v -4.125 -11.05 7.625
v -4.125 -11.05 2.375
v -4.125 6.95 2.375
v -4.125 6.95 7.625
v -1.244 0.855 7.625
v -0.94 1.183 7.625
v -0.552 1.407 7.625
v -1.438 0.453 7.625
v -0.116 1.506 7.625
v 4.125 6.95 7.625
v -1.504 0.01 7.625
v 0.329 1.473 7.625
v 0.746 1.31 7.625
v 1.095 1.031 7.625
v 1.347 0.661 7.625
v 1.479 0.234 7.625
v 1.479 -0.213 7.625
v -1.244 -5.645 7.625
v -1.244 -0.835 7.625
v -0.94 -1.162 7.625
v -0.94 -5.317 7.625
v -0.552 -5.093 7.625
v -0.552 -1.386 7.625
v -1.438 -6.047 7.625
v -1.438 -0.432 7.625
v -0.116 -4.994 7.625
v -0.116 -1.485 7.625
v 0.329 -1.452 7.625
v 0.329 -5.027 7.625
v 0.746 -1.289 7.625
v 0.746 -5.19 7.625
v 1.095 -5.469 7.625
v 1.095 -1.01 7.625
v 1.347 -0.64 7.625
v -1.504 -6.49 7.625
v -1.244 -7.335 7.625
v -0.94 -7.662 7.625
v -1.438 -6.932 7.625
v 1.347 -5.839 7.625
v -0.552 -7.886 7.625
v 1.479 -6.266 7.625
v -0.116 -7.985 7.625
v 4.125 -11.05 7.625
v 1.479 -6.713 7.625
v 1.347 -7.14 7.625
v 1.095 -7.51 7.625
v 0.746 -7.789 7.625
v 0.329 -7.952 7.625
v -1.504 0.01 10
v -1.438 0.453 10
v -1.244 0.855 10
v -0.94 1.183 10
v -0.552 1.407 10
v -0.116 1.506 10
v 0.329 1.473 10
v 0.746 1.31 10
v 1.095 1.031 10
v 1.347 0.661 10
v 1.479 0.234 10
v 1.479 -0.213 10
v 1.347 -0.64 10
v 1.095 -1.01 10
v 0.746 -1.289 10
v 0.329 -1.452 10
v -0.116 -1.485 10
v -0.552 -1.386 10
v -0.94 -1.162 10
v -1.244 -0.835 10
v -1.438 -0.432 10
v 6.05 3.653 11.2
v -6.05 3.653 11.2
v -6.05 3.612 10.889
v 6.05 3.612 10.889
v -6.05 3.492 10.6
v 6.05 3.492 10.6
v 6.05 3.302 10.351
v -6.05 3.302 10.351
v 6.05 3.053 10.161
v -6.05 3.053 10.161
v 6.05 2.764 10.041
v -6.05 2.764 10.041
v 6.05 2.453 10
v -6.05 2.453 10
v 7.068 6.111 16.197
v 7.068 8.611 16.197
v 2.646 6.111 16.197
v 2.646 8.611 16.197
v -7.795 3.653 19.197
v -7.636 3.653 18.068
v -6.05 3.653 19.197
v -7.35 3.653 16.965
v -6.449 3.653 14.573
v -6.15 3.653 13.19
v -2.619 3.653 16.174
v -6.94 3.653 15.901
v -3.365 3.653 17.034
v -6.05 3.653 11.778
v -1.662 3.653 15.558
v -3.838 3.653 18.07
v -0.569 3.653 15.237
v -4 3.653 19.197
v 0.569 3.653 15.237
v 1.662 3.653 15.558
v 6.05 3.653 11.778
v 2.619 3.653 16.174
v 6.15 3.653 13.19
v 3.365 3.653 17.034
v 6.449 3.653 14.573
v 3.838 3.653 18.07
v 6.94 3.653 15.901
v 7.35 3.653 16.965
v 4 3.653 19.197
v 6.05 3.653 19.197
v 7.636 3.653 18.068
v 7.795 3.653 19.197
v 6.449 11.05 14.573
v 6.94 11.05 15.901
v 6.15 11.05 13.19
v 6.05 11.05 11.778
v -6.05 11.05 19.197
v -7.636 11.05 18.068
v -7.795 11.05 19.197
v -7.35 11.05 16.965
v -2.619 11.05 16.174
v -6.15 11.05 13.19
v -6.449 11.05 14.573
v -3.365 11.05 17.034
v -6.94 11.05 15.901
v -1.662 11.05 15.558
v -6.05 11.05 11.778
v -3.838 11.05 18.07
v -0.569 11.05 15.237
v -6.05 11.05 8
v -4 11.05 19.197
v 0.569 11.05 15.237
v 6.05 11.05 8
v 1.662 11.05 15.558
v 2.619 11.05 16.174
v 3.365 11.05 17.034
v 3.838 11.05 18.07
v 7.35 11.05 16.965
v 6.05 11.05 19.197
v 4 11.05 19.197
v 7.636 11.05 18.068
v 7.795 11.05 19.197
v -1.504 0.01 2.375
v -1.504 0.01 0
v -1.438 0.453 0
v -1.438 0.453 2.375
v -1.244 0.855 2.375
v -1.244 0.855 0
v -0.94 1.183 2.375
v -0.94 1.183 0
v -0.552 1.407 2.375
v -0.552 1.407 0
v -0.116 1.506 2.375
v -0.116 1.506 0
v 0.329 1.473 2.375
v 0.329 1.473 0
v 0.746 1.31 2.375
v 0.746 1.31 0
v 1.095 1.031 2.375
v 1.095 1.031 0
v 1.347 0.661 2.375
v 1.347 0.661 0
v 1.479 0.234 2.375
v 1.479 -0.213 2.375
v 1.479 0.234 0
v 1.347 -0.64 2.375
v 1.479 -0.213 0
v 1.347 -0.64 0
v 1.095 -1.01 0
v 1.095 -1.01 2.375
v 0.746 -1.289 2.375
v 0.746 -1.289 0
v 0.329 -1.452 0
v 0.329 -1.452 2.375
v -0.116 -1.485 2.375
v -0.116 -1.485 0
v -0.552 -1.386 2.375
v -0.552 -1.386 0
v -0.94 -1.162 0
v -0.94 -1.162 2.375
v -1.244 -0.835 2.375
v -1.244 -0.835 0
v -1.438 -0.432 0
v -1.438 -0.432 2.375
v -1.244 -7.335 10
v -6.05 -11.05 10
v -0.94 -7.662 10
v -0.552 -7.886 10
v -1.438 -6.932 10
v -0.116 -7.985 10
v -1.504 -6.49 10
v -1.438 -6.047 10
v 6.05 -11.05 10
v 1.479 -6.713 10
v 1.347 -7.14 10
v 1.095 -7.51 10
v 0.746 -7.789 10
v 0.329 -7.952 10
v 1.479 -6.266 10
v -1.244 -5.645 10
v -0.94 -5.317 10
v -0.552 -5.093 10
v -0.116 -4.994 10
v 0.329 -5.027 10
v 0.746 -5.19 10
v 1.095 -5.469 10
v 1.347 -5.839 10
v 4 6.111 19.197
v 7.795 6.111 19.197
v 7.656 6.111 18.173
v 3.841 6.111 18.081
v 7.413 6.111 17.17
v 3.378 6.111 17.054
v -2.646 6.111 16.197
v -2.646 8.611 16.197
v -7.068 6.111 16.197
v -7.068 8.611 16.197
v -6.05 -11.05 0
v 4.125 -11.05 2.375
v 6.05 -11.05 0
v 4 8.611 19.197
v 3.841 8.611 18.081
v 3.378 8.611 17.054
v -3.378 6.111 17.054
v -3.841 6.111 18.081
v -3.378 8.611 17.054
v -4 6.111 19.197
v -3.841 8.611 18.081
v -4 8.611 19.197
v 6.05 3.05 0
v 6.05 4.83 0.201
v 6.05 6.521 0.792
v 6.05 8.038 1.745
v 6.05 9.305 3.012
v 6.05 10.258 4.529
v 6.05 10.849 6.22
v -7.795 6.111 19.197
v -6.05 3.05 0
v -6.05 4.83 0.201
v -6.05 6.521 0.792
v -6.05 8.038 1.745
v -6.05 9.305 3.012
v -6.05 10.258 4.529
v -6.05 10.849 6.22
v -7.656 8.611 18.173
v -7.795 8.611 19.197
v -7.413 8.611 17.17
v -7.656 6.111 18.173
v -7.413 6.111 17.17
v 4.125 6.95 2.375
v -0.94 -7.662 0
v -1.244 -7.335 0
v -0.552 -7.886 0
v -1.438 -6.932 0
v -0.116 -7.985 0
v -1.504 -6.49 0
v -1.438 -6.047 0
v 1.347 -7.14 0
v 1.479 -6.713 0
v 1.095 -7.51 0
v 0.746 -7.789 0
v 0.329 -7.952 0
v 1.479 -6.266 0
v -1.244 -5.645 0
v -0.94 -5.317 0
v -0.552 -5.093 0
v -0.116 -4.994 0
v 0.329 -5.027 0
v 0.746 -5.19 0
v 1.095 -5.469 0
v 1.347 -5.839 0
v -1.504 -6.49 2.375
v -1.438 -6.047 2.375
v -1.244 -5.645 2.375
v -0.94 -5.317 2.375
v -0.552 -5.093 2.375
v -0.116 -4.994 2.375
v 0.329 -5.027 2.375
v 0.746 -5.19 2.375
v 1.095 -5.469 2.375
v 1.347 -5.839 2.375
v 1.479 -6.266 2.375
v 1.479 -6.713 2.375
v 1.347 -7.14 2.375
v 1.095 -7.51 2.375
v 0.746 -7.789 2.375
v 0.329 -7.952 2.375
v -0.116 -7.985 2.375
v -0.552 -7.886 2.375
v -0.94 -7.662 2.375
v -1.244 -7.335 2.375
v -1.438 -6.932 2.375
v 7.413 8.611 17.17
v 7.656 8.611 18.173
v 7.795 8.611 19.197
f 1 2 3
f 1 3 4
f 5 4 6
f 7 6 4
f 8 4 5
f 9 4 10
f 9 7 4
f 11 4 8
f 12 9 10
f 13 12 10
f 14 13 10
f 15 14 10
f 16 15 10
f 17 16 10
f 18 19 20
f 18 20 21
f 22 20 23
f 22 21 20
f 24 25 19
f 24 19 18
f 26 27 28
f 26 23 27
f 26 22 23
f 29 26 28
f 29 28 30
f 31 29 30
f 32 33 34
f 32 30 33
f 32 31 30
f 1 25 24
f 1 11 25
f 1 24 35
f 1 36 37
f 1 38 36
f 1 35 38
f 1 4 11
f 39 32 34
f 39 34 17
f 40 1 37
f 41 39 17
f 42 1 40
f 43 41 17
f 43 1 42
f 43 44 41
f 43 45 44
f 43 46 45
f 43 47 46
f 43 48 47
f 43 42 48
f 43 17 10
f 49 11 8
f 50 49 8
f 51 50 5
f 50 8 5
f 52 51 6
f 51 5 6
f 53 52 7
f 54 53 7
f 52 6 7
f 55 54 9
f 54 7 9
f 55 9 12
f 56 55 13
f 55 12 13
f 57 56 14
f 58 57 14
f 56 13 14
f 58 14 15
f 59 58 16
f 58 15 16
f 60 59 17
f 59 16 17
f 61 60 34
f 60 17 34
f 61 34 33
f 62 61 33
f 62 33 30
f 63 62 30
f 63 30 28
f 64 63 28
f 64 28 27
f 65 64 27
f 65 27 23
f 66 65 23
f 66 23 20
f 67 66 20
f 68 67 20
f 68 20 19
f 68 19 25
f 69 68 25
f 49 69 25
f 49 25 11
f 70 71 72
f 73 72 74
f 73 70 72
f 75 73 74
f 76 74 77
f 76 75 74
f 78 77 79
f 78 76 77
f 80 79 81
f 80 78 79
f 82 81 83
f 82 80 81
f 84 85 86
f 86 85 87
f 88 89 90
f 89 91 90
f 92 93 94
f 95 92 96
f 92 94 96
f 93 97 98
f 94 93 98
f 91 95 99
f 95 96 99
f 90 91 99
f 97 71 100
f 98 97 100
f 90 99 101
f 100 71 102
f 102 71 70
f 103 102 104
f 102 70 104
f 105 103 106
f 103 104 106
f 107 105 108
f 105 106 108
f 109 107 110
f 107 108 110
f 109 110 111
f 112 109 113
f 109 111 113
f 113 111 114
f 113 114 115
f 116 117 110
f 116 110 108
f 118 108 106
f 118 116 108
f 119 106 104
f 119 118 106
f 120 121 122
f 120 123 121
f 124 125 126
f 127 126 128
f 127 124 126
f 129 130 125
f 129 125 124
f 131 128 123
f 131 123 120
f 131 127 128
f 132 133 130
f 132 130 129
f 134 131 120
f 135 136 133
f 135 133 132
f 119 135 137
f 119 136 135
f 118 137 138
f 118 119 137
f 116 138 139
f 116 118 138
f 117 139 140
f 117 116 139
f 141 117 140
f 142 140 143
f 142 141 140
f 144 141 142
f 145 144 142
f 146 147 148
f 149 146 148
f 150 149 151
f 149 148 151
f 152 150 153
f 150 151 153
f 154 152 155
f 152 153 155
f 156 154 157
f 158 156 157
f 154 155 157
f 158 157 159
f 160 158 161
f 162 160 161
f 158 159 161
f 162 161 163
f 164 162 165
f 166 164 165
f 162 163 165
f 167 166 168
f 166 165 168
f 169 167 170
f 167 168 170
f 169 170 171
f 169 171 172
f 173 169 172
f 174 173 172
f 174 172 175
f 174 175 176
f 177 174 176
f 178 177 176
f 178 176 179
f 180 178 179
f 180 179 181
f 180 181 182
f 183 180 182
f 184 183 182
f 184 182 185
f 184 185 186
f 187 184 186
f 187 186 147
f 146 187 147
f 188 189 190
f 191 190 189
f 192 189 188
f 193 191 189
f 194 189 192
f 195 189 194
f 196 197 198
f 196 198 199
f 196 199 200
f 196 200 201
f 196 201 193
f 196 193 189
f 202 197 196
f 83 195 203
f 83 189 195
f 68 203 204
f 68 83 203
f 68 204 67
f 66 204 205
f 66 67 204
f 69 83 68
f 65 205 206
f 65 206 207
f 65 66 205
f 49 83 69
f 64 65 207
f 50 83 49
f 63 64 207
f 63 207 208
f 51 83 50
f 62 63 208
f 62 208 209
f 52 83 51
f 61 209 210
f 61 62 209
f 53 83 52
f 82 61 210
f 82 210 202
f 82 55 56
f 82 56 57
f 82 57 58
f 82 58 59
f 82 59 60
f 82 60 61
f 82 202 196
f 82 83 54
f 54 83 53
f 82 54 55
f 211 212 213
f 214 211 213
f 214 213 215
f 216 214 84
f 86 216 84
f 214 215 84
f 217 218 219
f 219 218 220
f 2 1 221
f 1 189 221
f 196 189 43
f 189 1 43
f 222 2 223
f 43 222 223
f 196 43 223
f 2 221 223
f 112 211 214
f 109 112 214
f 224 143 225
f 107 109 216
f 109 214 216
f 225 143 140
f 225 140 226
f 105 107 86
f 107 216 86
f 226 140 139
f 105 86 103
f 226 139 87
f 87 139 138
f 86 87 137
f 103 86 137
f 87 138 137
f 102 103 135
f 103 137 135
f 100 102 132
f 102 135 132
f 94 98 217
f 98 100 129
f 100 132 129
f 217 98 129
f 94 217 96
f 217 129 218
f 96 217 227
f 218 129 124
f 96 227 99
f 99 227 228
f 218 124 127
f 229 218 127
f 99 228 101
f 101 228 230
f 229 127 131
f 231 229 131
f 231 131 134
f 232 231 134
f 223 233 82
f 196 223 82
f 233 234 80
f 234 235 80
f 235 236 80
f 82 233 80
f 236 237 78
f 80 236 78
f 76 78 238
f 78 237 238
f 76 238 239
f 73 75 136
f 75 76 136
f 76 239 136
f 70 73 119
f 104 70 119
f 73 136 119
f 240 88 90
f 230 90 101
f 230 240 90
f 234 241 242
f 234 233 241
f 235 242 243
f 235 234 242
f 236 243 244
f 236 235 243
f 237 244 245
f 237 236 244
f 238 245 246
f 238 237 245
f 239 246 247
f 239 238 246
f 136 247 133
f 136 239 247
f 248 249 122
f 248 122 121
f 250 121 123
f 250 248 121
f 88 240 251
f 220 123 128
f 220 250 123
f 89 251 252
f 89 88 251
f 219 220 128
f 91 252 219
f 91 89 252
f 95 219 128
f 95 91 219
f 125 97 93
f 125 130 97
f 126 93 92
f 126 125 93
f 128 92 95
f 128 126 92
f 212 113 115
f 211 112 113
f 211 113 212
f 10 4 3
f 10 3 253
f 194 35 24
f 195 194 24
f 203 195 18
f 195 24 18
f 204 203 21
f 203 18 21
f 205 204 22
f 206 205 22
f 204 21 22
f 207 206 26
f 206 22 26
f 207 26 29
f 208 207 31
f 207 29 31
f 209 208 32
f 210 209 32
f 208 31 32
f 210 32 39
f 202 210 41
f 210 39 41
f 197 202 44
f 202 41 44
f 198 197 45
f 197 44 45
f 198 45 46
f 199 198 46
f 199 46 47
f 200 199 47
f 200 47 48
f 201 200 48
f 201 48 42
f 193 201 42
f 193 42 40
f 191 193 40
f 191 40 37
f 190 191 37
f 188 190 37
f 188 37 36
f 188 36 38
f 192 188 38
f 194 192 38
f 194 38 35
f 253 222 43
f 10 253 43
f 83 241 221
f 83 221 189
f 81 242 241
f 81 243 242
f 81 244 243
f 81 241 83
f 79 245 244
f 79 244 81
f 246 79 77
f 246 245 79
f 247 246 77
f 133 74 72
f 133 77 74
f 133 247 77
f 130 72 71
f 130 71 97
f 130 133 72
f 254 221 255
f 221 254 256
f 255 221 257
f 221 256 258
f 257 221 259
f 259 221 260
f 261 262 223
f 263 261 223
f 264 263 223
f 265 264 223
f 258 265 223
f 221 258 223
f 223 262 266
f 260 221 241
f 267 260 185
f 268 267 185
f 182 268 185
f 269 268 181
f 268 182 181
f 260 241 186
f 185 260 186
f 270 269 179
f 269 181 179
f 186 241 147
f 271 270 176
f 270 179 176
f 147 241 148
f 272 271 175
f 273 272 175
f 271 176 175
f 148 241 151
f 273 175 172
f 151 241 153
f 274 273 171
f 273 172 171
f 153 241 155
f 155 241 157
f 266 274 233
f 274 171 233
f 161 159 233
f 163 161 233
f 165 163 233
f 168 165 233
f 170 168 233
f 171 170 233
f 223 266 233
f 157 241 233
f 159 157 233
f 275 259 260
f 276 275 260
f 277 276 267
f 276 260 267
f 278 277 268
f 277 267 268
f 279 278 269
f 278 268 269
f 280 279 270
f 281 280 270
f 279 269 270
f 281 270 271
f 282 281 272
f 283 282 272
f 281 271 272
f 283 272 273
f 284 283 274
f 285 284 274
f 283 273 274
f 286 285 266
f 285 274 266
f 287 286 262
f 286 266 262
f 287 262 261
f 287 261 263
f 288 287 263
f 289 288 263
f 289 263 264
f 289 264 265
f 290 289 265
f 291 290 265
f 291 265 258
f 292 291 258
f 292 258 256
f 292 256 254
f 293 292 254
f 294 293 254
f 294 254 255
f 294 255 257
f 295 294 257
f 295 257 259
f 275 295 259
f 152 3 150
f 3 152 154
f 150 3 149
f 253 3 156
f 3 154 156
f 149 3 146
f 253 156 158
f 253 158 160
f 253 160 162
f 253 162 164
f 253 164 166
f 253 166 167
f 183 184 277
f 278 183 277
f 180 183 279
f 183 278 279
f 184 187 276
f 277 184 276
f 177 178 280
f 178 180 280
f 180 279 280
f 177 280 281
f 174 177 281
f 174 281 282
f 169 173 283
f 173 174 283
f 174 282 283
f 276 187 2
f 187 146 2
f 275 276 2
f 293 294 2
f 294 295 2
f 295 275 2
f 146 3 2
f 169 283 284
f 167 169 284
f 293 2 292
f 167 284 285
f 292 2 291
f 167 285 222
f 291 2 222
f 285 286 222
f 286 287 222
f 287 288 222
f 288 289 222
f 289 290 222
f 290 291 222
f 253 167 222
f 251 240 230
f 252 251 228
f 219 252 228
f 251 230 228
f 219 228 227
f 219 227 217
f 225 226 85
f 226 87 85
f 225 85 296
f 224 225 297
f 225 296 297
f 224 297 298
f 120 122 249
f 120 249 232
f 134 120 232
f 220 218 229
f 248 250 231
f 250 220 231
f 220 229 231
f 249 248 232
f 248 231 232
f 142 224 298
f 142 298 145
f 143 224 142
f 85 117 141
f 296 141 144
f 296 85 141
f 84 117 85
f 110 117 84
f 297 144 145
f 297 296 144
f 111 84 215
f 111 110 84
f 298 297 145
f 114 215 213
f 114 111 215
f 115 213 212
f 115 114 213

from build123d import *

# Parameters (mm, degrees)
IZIM1_W                     = 12.1
IZIM1_H                     = 22.1
Y_KSEKLIK_EKSTR_ZYON1_DEPTH = 10
IZIM2_W                     = 8.25
IZIM2_H                     = 5.25
KES_EKSTR_ZYON1_DEPTH       = 18
IZIM3_R                     = 1.5
KES_EKSTR_ZYON2_DEPTH       = 17.084309124
IZIM4_W                     = 9.196571059
IZIM4_H                     = 7.396734232
Y_KSEKLIK_EKSTR_ZYON2_DEPTH = 12.1
IZIM6_W                     = 3.5
IZIM6_H                     = 2.438999841
IZIM6_H_2                   = 2.5
IZIM6_H_3                   = 2.457734391
IZIM6_W_2                   = 4.3
KES_EKSTR_ZYON3_DEPTH       = 3
RADYUS1_R                   = 1.2
RADYUS2_R                   = 8
IZIM7_R                     = 4
KES_EKSTR_ZYON4_DEPTH       = 10
IZIM8_W                     = 1.744878744
IZIM8_H                     = 1.717356621
Y_KSEKLIK_EKSTR_ZYON3_DEPTH = 7.396734232
KES_EKSTR_ZYON5_DEPTH       = 50
KES_EKSTR_ZYON5_DEPTH_BACK  = 50
IZIM9_W                     = 3
IZIM9_H                     = 2.5
RADYUS3_R                   = 10
RADYUS4_START               = 3
RADYUS4_DEPTH               = 9


with BuildPart() as part:
    # Çizim1 → Yükseklik-Ekstrüzyon1 (new body)
    with BuildSketch(Plane.XY):
        Rectangle(IZIM1_W, IZIM1_H)
    extrude(amount=Y_KSEKLIK_EKSTR_ZYON1_DEPTH)

    # Çizim2 → Kes-Ekstrüzyon1 (cut)
    with BuildSketch(Plane.XZ.offset(11.05)):
        with Locations((0, 5)):
            Rectangle(IZIM2_W, IZIM2_H)
    extrude(amount=-KES_EKSTR_ZYON1_DEPTH, mode=Mode.SUBTRACT)

    # Çizim3 → Kes-Ekstrüzyon2 (cut, through all)
    with BuildSketch(Plane(origin=(0, 0, 0), x_dir=(-1, 0, 0), z_dir=(0, 0, -1))):
        with Locations((0.004348468, -6.489526702)):
            Circle(IZIM3_R)
        with Locations((0.004348468, 0.010473298)):
            Circle(IZIM3_R)
    extrude(amount=-KES_EKSTR_ZYON2_DEPTH, mode=Mode.SUBTRACT)

    # Çizim4 → Yükseklik-Ekstrüzyon2 (add, through all)
    with BuildSketch(Plane.ZY.offset(6.05)):
        with Locations((14.59828553, 7.351632884)):
            Rectangle(IZIM4_W, IZIM4_H)
    extrude(amount=-Y_KSEKLIK_EKSTR_ZYON2_DEPTH)

    # Çizim6 → Kes-Ekstrüzyon3 (cut)
    with BuildSketch(Plane.XY.offset(19.196571059)):
        with Locations((0, 9.83050008)):
            Rectangle(IZIM6_W, IZIM6_H)
        with Locations((0, 7.361000159)):
            Rectangle(IZIM6_W, IZIM6_H_2)
        with Locations((0, 4.882132964)):
            Rectangle(IZIM6_W, IZIM6_H_3)
        with Locations((3.9, 7.361000159)):
            Rectangle(IZIM6_W_2, IZIM6_H_2)
        with Locations((-3.9, 7.361000159)):
            Rectangle(IZIM6_W_2, IZIM6_H_2)
    extrude(amount=-KES_EKSTR_ZYON3_DEPTH, mode=Mode.SUBTRACT)

    # Radyus1
    radyus1_edges = [part.edges().sort_by_distance(p)[0] for p in [
        (0, 3.653265768, 10),
    ]]
    fillet(radyus1_edges, radius=RADYUS1_R)

    # Radyus2
    radyus2_edges = [part.edges().sort_by_distance(p)[0] for p in [
        (0, 11.05, 0),
    ]]
    fillet(radyus2_edges, radius=RADYUS2_R)

    # Çizim7 → Kes-Ekstrüzyon4 (cut)
    with BuildSketch(Plane(origin=(0, 11.05, 0), x_dir=(1, 0, 0), z_dir=(0, 1, 0))):
        with Locations((0, -19.196571059)):
            Circle(IZIM7_R)
    extrude(amount=-KES_EKSTR_ZYON4_DEPTH, mode=Mode.SUBTRACT)

    # Çizim8 → Yükseklik-Ekstrüzyon3 (add)
    with BuildSketch(Plane(origin=(0, 11.05, 0), x_dir=(1, 0, 0), z_dir=(0, 1, 0))):
        with Locations((-6.922439372, -18.337892748)):
            Rectangle(IZIM8_W, IZIM8_H)
        Polygon((-6.05, -14.458244553), (-7.794878744, -17.479214438), (-6.05, -17.479214438), align=None)
        Polygon((6.05, -17.479214438), (7.794878744, -17.479214438), (6.05, -14.458244553), align=None)
        with Locations((6.922439372, -18.337892748)):
            Rectangle(IZIM8_W, IZIM8_H)
    extrude(amount=-Y_KSEKLIK_EKSTR_ZYON3_DEPTH)

    # Çizim9 → Kes-Ekstrüzyon5 (cut, two sides: drawn at the far end of the back side and taken through both)
    with BuildSketch(Plane.ZY.offset(-6.05).offset(-KES_EKSTR_ZYON5_DEPTH_BACK)):
        with Locations((17.696571059, 7.361000159)):
            Rectangle(IZIM9_W, IZIM9_H)
    extrude(amount=KES_EKSTR_ZYON5_DEPTH + KES_EKSTR_ZYON5_DEPTH_BACK, mode=Mode.SUBTRACT)

    # Radyus3
    # the kernel refuses this fillet: 10 mm, written as the material it adds along each edge
    with BuildSketch(Plane(origin=(6.05, 11.05, 14.458244553), x_dir=(0, 0, -1), z_dir=(0, -1, 0))) as radyus3_piece_1_section:
        with BuildLine():
            CenterArc((RADYUS3_R * 0.268045105611, RADYUS3_R), RADYUS3_R, 239.989745652, 30.010254348)
            Line((-RADYUS3_R * 0.232109880799, RADYUS3_R * 0.134064096154), (0, 0))
            Line((0, 0), (RADYUS3_R * 0.268045105611, 0))
        make_face()
    radyus3_piece_1 = extrude(amount=7.396734232, mode=Mode.PRIVATE)
    radyus3_piece_1 = split(radyus3_piece_1, bisect_by=Plane(origin=(6.05, 8.611000159, 14.458244553), z_dir=(0, 1, 0)), keep=Keep.TOP, mode=Mode.PRIVATE)
    radyus3_piece_1 = split(radyus3_piece_1, bisect_by=Plane(origin=(6.05, 11.05, 16.196571059), z_dir=(0, 0, -1)), keep=Keep.TOP, mode=Mode.PRIVATE)
    add(radyus3_piece_1)
    with BuildSketch(Plane(origin=(6.05, 11.05, 14.458244553), x_dir=(0, 0, -1), z_dir=(0, -1, 0))) as radyus3_piece_2_section:
        with BuildLine():
            CenterArc((RADYUS3_R * 0.268045105611, RADYUS3_R), RADYUS3_R, 239.989745652, 30.010254348)
            Line((-RADYUS3_R * 0.232109880799, RADYUS3_R * 0.134064096154), (0, 0))
            Line((0, 0), (RADYUS3_R * 0.268045105611, 0))
        make_face()
    radyus3_piece_2 = extrude(amount=7.396734232, mode=Mode.PRIVATE)
    radyus3_piece_2 = split(radyus3_piece_2, bisect_by=Plane(origin=(6.05, 8.611000159, 14.458244553), z_dir=(0, 1, 0)), keep=Keep.TOP, mode=Mode.PRIVATE)
    radyus3_piece_2 = split(radyus3_piece_2, bisect_by=Plane(origin=(6.05, 11.05, 16.196571059), z_dir=(0, 0, 1)), keep=Keep.TOP, mode=Mode.PRIVATE)
    add(radyus3_piece_2)
    with BuildSketch(Plane(origin=(6.05, 11.05, 14.458244553), x_dir=(0, 0, -1), z_dir=(0, -1, 0))) as radyus3_piece_3_section:
        with BuildLine():
            CenterArc((RADYUS3_R * 0.268045105611, RADYUS3_R), RADYUS3_R, 239.989745652, 30.010254348)
            Line((-RADYUS3_R * 0.232109880799, RADYUS3_R * 0.134064096154), (0, 0))
            Line((0, 0), (RADYUS3_R * 0.268045105611, 0))
        make_face()
    radyus3_piece_3 = extrude(amount=7.396734232, mode=Mode.PRIVATE)
    radyus3_piece_3 = split(radyus3_piece_3, bisect_by=Plane(origin=(6.05, 8.611000159, 14.458244553), z_dir=(0, -1, 0)), keep=Keep.TOP, mode=Mode.PRIVATE)
    radyus3_piece_3 = split(radyus3_piece_3, bisect_by=Plane(origin=(6.05, 11.05, 16.196571059), z_dir=(0, 0, -1)), keep=Keep.TOP, mode=Mode.PRIVATE)
    radyus3_piece_3 = split(radyus3_piece_3, bisect_by=Plane(origin=(6.05, 6.111000159, 14.458244553), z_dir=(0, 1, 0)), keep=Keep.TOP, mode=Mode.PRIVATE)
    add(radyus3_piece_3)
    with BuildSketch(Plane(origin=(6.05, 11.05, 14.458244553), x_dir=(0, 0, -1), z_dir=(0, -1, 0))) as radyus3_piece_4_section:
        with BuildLine():
            CenterArc((RADYUS3_R * 0.268045105611, RADYUS3_R), RADYUS3_R, 239.989745652, 30.010254348)
            Line((-RADYUS3_R * 0.232109880799, RADYUS3_R * 0.134064096154), (0, 0))
            Line((0, 0), (RADYUS3_R * 0.268045105611, 0))
        make_face()
    radyus3_piece_4 = extrude(amount=7.396734232, mode=Mode.PRIVATE)
    radyus3_piece_4 = split(radyus3_piece_4, bisect_by=Plane(origin=(6.05, 11.05, 16.196571059), z_dir=(0, 0, -1)), keep=Keep.TOP, mode=Mode.PRIVATE)
    radyus3_piece_4 = split(radyus3_piece_4, bisect_by=Plane(origin=(6.05, 6.111000159, 14.458244553), z_dir=(0, -1, 0)), keep=Keep.TOP, mode=Mode.PRIVATE)
    add(radyus3_piece_4)
    with BuildSketch(Plane(origin=(6.05, 11.05, 14.458244553), x_dir=(0, 0, -1), z_dir=(0, -1, 0))) as radyus3_piece_5_section:
        with BuildLine():
            CenterArc((RADYUS3_R * 0.268045105611, RADYUS3_R), RADYUS3_R, 239.989745652, 30.010254348)
            Line((-RADYUS3_R * 0.232109880799, RADYUS3_R * 0.134064096154), (0, 0))
            Line((0, 0), (RADYUS3_R * 0.268045105611, 0))
        make_face()
    radyus3_piece_5 = extrude(amount=7.396734232, mode=Mode.PRIVATE)
    radyus3_piece_5 = split(radyus3_piece_5, bisect_by=Plane(origin=(6.05, 11.05, 16.196571059), z_dir=(0, 0, 1)), keep=Keep.TOP, mode=Mode.PRIVATE)
    radyus3_piece_5 = split(radyus3_piece_5, bisect_by=Plane(origin=(6.05, 6.111000159, 14.458244553), z_dir=(0, -1, 0)), keep=Keep.TOP, mode=Mode.PRIVATE)
    add(radyus3_piece_5)
    with BuildSketch(Plane(origin=(-6.05, 11.05, 14.458244553), x_dir=(0, 0, -1), z_dir=(0, -1, 0))) as radyus3_piece_6_section:
        with BuildLine():
            CenterArc((RADYUS3_R * 0.268045105611, -RADYUS3_R), RADYUS3_R, 90, 30.010254348)
            Line((-RADYUS3_R * 0.232109880799, -RADYUS3_R * 0.134064096154), (0, 0))
            Line((0, 0), (RADYUS3_R * 0.268045105611, 0))
        make_face()
    radyus3_piece_6 = extrude(amount=7.396734232, mode=Mode.PRIVATE)
    radyus3_piece_6 = split(radyus3_piece_6, bisect_by=Plane(origin=(-6.05, 8.611000159, 14.458244553), z_dir=(0, 1, 0)), keep=Keep.TOP, mode=Mode.PRIVATE)
    radyus3_piece_6 = split(radyus3_piece_6, bisect_by=Plane(origin=(-6.05, 11.05, 16.196571059), z_dir=(0, 0, -1)), keep=Keep.TOP, mode=Mode.PRIVATE)
    add(radyus3_piece_6)
    with BuildSketch(Plane(origin=(-6.05, 11.05, 14.458244553), x_dir=(0, 0, -1), z_dir=(0, -1, 0))) as radyus3_piece_7_section:
        with BuildLine():
            CenterArc((RADYUS3_R * 0.268045105611, -RADYUS3_R), RADYUS3_R, 90, 30.010254348)
            Line((-RADYUS3_R * 0.232109880799, -RADYUS3_R * 0.134064096154), (0, 0))
            Line((0, 0), (RADYUS3_R * 0.268045105611, 0))
        make_face()
    radyus3_piece_7 = extrude(amount=7.396734232, mode=Mode.PRIVATE)
    radyus3_piece_7 = split(radyus3_piece_7, bisect_by=Plane(origin=(-6.05, 8.611000159, 14.458244553), z_dir=(0, 1, 0)), keep=Keep.TOP, mode=Mode.PRIVATE)
    radyus3_piece_7 = split(radyus3_piece_7, bisect_by=Plane(origin=(-6.05, 11.05, 16.196571059), z_dir=(0, 0, 1)), keep=Keep.TOP, mode=Mode.PRIVATE)
    add(radyus3_piece_7)
    with BuildSketch(Plane(origin=(-6.05, 11.05, 14.458244553), x_dir=(0, 0, -1), z_dir=(0, -1, 0))) as radyus3_piece_8_section:
        with BuildLine():
            CenterArc((RADYUS3_R * 0.268045105611, -RADYUS3_R), RADYUS3_R, 90, 30.010254348)
            Line((-RADYUS3_R * 0.232109880799, -RADYUS3_R * 0.134064096154), (0, 0))
            Line((0, 0), (RADYUS3_R * 0.268045105611, 0))
        make_face()
    radyus3_piece_8 = extrude(amount=7.396734232, mode=Mode.PRIVATE)
    radyus3_piece_8 = split(radyus3_piece_8, bisect_by=Plane(origin=(-6.05, 8.611000159, 14.458244553), z_dir=(0, -1, 0)), keep=Keep.TOP, mode=Mode.PRIVATE)
    radyus3_piece_8 = split(radyus3_piece_8, bisect_by=Plane(origin=(-6.05, 11.05, 16.196571059), z_dir=(0, 0, -1)), keep=Keep.TOP, mode=Mode.PRIVATE)
    radyus3_piece_8 = split(radyus3_piece_8, bisect_by=Plane(origin=(-6.05, 6.111000159, 14.458244553), z_dir=(0, 1, 0)), keep=Keep.TOP, mode=Mode.PRIVATE)
    add(radyus3_piece_8)
    with BuildSketch(Plane(origin=(-6.05, 11.05, 14.458244553), x_dir=(0, 0, -1), z_dir=(0, -1, 0))) as radyus3_piece_9_section:
        with BuildLine():
            CenterArc((RADYUS3_R * 0.268045105611, -RADYUS3_R), RADYUS3_R, 90, 30.010254348)
            Line((-RADYUS3_R * 0.232109880799, -RADYUS3_R * 0.134064096154), (0, 0))
            Line((0, 0), (RADYUS3_R * 0.268045105611, 0))
        make_face()
    radyus3_piece_9 = extrude(amount=7.396734232, mode=Mode.PRIVATE)
    radyus3_piece_9 = split(radyus3_piece_9, bisect_by=Plane(origin=(-6.05, 11.05, 16.196571059), z_dir=(0, 0, -1)), keep=Keep.TOP, mode=Mode.PRIVATE)
    radyus3_piece_9 = split(radyus3_piece_9, bisect_by=Plane(origin=(-6.05, 6.111000159, 14.458244553), z_dir=(0, -1, 0)), keep=Keep.TOP, mode=Mode.PRIVATE)
    add(radyus3_piece_9)
    with BuildSketch(Plane(origin=(-6.05, 11.05, 14.458244553), x_dir=(0, 0, -1), z_dir=(0, -1, 0))) as radyus3_piece_10_section:
        with BuildLine():
            CenterArc((RADYUS3_R * 0.268045105611, -RADYUS3_R), RADYUS3_R, 90, 30.010254348)
            Line((-RADYUS3_R * 0.232109880799, -RADYUS3_R * 0.134064096154), (0, 0))
            Line((0, 0), (RADYUS3_R * 0.268045105611, 0))
        make_face()
    radyus3_piece_10 = extrude(amount=7.396734232, mode=Mode.PRIVATE)
    radyus3_piece_10 = split(radyus3_piece_10, bisect_by=Plane(origin=(-6.05, 11.05, 16.196571059), z_dir=(0, 0, 1)), keep=Keep.TOP, mode=Mode.PRIVATE)
    radyus3_piece_10 = split(radyus3_piece_10, bisect_by=Plane(origin=(-6.05, 6.111000159, 14.458244553), z_dir=(0, -1, 0)), keep=Keep.TOP, mode=Mode.PRIVATE)
    add(radyus3_piece_10)

    # Radyus4: read off the stored shape, not the designer's step
    # Radyus4 outline → Radyus4 (cut)
    with BuildSketch(Plane(origin=(0, 0, 0), x_dir=(1, 0, 0), z_dir=(0, 1, 0)).offset(RADYUS4_START)):
        with BuildLine():
            ThreePointArc((-7.794878744, -19.196571059), (-7.508526716, -17.512091406), (-6.939589091, -15.900949214))
            ThreePointArc((-6.939589091, -15.900949214), (-7.154266469, -16.345716978), (-7.390640962, -16.779343361))
            Line((-7.390640962, -16.779343361), (-7.794878744, -17.479214438))
            Line((-7.794878744, -17.479214438), (-7.794878744, -19.196571059))
        make_face()
        with BuildLine():
            ThreePointArc((6.939589091, -15.900949214), (7.508526716, -17.512091406), (7.794878744, -19.196571059))
            Line((7.794878744, -19.196571059), (7.794878744, -17.479214438))
            Line((7.794878744, -17.479214438), (7.390640962, -16.779343361))
            ThreePointArc((7.390640962, -16.779343361), (7.154266469, -16.345716978), (6.939589091, -15.900949214))
        make_face()
    extrude(amount=RADYUS4_DEPTH, mode=Mode.SUBTRACT)


solid = part.part
